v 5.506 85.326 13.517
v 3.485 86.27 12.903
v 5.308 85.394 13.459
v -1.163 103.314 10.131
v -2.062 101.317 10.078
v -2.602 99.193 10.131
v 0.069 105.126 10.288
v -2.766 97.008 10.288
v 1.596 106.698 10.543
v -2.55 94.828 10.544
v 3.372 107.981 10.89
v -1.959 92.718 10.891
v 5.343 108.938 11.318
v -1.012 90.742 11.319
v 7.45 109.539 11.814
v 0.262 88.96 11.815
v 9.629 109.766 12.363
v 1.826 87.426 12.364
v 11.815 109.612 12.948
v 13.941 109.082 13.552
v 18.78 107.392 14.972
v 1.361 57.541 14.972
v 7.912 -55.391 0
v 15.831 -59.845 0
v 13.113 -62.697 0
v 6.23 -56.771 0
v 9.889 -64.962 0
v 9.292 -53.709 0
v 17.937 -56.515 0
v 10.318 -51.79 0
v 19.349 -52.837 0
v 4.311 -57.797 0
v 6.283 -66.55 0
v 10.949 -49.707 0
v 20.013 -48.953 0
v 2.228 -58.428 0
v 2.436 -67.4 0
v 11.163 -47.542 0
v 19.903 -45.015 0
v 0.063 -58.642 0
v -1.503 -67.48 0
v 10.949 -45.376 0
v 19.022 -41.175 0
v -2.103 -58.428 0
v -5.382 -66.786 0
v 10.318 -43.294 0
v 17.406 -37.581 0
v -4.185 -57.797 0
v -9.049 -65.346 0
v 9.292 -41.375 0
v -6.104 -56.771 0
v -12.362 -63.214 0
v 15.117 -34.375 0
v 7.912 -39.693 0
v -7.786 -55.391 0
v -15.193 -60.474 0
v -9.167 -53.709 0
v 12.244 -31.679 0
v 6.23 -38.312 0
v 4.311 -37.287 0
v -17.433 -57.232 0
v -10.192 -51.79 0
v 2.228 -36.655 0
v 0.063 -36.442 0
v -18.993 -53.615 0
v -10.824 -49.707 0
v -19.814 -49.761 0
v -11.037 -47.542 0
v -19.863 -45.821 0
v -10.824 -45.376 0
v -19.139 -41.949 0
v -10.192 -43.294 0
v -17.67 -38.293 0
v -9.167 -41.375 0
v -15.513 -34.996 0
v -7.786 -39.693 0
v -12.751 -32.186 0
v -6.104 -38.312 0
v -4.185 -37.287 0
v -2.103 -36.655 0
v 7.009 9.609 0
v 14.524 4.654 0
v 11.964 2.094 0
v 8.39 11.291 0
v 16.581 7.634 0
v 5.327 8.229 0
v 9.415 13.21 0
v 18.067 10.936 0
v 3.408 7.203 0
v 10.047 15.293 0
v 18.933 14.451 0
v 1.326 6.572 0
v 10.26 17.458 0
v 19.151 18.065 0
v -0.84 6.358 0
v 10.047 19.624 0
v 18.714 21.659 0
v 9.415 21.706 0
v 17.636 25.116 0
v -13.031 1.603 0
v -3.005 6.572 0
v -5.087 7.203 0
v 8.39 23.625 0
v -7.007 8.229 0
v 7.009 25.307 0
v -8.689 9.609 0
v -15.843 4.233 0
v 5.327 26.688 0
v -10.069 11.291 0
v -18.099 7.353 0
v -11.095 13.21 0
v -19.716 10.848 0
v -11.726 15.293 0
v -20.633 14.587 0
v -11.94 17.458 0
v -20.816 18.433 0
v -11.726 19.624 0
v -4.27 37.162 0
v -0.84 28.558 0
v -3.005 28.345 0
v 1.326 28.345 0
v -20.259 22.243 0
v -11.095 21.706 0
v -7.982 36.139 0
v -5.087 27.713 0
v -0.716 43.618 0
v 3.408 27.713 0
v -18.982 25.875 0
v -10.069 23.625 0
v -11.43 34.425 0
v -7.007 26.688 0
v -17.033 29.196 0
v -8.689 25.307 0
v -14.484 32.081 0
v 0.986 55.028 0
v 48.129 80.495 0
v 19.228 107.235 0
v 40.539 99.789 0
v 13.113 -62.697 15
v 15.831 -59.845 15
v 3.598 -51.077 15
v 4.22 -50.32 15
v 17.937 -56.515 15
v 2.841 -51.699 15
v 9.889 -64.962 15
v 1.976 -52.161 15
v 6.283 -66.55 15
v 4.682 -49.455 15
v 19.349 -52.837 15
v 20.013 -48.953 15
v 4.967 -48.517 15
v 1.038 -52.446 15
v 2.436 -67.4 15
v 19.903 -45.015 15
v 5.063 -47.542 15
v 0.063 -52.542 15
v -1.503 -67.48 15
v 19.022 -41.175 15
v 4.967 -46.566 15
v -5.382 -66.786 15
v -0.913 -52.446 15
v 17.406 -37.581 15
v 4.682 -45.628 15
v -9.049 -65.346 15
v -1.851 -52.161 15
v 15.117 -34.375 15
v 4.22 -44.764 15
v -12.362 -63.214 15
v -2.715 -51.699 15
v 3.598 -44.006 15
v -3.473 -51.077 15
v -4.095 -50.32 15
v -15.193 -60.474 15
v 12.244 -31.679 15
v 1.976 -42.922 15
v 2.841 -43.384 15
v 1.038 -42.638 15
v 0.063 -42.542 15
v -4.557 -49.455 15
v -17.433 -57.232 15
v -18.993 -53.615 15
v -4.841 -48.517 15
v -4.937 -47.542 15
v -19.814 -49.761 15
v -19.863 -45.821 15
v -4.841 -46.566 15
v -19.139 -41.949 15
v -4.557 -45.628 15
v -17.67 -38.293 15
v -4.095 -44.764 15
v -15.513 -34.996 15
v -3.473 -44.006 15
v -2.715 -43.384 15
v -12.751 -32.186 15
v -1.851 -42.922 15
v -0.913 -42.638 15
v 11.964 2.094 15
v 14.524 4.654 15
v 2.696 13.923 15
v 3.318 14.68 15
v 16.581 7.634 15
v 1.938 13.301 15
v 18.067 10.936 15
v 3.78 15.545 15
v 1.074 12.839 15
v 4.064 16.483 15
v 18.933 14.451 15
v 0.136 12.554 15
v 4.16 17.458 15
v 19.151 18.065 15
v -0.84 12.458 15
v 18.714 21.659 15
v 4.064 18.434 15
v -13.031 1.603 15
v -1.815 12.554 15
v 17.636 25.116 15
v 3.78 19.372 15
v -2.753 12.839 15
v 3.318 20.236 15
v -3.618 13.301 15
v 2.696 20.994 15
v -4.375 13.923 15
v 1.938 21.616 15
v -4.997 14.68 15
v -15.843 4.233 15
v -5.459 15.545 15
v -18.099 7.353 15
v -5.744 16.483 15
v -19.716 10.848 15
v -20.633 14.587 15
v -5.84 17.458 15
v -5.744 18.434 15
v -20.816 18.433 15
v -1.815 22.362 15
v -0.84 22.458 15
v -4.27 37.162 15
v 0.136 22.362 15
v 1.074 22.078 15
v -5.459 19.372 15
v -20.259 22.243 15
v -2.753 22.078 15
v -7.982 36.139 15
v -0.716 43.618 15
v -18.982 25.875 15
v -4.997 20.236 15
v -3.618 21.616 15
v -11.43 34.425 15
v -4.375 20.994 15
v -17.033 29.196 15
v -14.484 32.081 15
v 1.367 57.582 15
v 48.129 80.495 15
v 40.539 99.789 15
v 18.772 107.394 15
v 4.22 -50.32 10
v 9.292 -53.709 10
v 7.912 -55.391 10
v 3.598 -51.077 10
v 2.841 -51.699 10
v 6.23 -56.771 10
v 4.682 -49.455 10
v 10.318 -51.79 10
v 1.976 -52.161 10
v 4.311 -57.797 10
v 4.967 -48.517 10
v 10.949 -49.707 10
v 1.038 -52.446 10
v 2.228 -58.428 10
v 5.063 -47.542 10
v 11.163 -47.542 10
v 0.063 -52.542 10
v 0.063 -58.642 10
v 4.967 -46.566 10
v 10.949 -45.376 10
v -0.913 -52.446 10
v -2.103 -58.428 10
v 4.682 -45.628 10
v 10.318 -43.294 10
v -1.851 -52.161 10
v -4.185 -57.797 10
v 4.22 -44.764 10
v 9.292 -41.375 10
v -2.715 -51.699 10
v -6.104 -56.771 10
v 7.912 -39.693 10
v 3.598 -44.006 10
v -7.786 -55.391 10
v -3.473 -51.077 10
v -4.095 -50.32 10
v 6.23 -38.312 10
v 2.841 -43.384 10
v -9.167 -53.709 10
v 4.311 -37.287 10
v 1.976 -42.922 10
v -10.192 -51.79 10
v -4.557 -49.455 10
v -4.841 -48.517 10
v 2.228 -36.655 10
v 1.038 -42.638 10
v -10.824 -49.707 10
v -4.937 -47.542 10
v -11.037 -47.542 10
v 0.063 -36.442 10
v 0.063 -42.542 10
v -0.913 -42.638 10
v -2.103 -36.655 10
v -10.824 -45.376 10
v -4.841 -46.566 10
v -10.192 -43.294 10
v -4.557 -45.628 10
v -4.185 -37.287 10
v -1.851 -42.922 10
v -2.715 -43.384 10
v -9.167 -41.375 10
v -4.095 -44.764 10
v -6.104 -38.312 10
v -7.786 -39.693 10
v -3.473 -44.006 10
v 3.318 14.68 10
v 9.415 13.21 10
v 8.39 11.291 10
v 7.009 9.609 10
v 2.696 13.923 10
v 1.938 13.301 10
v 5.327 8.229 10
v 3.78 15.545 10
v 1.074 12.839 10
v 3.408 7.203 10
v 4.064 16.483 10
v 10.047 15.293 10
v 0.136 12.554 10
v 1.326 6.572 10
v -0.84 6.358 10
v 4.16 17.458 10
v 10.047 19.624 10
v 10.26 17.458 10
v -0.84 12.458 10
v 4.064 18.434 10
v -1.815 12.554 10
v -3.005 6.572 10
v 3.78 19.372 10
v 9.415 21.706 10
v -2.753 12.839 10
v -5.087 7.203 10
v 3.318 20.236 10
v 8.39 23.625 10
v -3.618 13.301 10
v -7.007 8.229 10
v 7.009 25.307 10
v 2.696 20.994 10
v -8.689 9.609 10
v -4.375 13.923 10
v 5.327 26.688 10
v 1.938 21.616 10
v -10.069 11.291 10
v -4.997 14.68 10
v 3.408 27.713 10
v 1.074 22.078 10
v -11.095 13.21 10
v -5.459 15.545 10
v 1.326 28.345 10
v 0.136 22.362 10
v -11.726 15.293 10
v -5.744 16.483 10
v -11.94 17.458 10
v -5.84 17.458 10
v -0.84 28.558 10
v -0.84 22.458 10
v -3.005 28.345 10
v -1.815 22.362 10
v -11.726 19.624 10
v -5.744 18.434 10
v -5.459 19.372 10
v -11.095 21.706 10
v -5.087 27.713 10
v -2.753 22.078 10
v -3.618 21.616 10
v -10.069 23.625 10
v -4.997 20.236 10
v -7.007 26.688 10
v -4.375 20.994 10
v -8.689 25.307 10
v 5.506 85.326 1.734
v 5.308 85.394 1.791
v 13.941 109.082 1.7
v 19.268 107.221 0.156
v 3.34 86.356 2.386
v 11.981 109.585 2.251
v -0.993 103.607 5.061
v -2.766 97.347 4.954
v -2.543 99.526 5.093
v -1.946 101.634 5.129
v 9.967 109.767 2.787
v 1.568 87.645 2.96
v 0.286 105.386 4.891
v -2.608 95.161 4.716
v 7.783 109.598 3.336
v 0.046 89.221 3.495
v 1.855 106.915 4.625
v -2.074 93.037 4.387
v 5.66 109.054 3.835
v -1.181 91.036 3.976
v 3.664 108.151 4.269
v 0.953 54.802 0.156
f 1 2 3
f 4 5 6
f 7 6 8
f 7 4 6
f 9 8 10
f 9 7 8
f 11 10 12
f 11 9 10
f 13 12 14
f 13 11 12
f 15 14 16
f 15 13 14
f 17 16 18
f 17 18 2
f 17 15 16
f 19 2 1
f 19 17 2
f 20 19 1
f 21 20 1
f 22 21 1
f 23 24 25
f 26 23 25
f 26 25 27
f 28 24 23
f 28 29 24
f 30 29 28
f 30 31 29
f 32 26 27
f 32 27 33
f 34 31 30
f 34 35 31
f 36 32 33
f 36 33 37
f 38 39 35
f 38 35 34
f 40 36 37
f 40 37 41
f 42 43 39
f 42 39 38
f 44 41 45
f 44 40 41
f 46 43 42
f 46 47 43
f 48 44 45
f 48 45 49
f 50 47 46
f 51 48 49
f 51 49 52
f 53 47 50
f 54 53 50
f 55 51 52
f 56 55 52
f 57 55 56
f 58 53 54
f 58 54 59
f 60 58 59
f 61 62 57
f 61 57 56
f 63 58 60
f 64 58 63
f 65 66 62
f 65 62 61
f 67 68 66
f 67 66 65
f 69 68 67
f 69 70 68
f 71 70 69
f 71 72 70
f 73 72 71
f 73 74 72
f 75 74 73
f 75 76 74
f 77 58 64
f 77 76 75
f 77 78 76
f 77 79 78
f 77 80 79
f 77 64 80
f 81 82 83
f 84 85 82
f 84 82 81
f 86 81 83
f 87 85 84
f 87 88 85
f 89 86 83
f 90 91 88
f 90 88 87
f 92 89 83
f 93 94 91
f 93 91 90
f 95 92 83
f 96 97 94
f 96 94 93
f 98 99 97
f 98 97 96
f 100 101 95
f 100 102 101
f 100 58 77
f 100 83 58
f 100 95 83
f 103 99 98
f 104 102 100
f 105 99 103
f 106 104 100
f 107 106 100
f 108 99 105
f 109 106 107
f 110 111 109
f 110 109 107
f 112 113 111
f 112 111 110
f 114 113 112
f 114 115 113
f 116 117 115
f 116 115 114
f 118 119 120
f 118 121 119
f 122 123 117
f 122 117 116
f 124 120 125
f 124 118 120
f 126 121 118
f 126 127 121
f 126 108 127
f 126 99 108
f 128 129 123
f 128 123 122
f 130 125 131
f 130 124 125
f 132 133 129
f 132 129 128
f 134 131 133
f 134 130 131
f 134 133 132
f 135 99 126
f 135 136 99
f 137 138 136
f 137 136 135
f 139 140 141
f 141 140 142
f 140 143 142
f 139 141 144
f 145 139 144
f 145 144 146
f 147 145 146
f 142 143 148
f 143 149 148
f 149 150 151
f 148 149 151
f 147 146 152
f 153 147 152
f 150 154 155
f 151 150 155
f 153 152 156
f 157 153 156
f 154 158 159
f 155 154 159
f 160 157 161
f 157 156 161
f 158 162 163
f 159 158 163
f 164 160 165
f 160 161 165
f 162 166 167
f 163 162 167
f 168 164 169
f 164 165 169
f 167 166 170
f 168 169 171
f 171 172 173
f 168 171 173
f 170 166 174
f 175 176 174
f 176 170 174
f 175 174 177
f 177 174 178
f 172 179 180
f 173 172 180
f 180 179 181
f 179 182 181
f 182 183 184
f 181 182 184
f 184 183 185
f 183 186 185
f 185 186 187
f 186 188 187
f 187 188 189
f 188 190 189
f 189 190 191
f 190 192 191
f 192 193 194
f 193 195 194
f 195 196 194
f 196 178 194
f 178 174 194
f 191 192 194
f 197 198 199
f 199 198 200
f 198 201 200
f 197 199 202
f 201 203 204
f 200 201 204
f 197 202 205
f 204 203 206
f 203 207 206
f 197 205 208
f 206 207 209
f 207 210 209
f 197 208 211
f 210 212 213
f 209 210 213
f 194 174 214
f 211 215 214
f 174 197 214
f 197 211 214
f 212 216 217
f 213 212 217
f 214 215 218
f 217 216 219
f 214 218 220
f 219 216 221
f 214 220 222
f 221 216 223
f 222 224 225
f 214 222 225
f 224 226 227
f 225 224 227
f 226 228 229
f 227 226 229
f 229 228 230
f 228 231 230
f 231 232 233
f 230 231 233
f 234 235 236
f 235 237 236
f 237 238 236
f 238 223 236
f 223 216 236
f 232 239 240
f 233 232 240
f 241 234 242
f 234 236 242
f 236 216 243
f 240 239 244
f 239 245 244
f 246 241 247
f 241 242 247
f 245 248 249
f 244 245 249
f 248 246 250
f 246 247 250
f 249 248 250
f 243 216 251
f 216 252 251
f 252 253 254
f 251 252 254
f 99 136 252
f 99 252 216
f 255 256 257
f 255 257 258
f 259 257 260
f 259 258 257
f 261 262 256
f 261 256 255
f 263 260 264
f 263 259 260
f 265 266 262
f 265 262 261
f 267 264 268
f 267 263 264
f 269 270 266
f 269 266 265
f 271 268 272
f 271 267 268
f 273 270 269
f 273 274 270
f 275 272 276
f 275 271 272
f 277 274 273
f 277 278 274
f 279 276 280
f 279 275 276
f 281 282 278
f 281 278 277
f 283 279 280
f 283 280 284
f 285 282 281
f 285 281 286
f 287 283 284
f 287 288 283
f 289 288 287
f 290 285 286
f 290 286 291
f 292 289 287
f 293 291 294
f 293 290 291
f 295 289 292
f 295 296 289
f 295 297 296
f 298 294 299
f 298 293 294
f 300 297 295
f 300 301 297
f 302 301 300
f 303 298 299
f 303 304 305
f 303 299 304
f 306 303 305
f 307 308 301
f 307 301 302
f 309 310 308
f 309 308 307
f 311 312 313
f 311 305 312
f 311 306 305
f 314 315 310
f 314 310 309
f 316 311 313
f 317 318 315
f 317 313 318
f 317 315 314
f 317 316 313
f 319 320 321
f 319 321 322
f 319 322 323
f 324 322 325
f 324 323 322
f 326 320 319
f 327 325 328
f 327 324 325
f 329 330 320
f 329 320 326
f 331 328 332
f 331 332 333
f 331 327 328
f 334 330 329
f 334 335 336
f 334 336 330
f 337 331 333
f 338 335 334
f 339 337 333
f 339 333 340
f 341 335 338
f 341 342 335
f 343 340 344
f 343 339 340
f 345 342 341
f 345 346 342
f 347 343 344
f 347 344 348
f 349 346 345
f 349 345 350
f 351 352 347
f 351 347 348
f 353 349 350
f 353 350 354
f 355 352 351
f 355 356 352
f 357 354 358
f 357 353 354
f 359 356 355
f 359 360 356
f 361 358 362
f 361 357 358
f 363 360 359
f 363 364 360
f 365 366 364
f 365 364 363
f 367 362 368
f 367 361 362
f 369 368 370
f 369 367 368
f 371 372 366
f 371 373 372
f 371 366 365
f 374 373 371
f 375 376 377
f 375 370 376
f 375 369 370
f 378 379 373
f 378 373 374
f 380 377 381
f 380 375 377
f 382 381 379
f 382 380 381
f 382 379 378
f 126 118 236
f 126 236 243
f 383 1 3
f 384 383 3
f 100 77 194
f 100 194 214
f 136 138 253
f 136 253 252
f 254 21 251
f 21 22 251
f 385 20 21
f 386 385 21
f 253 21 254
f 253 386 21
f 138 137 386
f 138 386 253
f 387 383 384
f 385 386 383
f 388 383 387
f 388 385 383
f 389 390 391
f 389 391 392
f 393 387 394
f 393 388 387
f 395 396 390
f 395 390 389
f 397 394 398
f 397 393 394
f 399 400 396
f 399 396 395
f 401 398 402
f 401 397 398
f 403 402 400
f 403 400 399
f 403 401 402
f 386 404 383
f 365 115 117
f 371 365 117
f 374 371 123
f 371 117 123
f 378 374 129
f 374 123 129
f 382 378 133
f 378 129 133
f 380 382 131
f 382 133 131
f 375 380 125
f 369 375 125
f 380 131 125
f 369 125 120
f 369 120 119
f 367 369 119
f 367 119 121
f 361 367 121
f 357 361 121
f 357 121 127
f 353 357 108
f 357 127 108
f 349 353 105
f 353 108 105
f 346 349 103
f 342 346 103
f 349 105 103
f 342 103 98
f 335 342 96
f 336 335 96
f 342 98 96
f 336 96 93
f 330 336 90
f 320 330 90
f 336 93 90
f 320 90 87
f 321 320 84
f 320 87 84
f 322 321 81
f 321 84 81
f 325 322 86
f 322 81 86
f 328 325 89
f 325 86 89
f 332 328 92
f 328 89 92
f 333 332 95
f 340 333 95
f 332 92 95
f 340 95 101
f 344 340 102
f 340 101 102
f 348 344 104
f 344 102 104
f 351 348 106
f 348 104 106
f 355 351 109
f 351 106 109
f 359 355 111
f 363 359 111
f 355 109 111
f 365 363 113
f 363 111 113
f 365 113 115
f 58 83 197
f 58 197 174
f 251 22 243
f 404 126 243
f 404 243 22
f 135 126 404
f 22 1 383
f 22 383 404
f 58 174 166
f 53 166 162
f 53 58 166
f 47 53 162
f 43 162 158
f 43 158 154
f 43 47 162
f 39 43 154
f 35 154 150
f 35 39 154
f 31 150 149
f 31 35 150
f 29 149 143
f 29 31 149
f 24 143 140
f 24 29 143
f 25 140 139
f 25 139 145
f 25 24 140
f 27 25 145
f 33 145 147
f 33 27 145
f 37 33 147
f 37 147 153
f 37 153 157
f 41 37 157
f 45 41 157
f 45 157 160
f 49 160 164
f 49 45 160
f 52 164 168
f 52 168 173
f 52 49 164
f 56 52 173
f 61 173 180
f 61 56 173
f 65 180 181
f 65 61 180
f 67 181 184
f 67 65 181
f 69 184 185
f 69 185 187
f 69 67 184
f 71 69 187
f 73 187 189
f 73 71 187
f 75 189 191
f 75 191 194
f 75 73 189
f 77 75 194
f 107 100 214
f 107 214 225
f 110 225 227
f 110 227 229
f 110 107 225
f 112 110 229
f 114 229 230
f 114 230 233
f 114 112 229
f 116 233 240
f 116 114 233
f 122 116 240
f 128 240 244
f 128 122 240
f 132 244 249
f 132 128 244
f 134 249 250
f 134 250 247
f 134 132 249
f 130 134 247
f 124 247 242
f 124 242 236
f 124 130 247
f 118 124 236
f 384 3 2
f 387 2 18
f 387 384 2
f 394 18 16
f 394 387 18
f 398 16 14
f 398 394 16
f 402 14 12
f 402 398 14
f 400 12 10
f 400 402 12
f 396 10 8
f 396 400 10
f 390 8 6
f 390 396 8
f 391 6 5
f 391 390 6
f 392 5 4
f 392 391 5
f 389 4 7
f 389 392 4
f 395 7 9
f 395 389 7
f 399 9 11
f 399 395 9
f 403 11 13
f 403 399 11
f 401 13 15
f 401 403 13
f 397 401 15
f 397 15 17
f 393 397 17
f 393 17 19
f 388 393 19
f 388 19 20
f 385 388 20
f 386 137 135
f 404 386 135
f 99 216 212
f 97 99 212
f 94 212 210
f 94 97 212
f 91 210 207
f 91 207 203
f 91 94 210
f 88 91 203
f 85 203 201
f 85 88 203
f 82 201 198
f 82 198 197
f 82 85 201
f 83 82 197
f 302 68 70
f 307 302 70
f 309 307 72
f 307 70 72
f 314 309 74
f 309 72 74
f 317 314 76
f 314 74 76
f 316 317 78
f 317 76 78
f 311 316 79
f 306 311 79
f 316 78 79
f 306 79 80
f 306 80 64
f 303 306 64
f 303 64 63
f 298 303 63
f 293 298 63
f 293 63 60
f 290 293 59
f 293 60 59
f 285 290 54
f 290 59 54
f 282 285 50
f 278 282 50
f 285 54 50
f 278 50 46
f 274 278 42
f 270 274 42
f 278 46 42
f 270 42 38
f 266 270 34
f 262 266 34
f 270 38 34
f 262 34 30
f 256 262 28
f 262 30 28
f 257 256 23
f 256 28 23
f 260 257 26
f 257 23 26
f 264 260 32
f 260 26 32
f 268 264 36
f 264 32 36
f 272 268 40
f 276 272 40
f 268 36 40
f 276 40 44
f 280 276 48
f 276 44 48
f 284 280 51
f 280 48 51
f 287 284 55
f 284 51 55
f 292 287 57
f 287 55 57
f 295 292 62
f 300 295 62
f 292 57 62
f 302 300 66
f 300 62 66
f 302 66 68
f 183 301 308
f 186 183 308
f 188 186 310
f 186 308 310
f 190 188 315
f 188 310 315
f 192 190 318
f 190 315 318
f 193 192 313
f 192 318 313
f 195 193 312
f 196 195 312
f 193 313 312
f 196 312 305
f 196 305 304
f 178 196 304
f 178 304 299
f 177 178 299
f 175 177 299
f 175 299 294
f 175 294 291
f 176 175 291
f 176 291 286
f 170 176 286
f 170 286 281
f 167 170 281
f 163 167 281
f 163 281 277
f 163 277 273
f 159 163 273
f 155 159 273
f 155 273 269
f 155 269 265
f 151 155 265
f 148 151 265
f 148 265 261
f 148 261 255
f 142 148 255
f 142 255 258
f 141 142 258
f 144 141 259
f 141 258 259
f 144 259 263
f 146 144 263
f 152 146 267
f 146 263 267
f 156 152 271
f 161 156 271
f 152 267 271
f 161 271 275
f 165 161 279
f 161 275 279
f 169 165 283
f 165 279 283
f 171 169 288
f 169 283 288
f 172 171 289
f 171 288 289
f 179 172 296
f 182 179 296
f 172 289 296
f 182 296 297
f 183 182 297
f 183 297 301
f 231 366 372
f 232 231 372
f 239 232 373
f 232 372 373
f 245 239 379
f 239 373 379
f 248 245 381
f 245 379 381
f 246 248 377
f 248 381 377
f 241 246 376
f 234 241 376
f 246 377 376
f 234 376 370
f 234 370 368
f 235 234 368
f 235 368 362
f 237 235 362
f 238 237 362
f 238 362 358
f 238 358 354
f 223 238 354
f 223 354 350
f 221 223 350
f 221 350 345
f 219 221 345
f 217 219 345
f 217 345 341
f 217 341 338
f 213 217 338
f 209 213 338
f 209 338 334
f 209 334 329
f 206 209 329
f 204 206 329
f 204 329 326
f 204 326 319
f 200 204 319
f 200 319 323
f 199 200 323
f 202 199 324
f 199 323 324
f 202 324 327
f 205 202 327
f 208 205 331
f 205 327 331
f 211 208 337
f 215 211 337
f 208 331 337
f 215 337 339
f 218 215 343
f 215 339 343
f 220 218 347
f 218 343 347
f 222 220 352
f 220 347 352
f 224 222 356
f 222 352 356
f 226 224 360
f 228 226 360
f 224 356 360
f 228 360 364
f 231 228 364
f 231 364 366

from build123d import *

# Parameters (mm, degrees)
BOSS_EXTRUDE1_DEPTH     = 15
SKETCH2_R               = 11.1
CUT_EXTRUDE1_DEPTH      = 10
SKETCH3_R               = 5
CUT_EXTRUDE2_DEPTH      = 10
CUT_EXTRUDE_THIN7_DEPTH = 62


with BuildPart() as part:
    # Sketch1 → Boss-Extrude1 (new body)
    with BuildSketch(Plane.XY):
        with BuildLine():
            Line((5.505816945, 85.326012217), (5.307768654, 85.393580353))
            ThreePointArc((5.307768654, 85.393580353), (-2.005055015, 101.475976607), (13.940536847, 109.082484312))
            Line((13.940536847, 109.082484312), (40.538740524, 99.7887516))
            Line((40.538740524, 99.7887516), (48.129208704, 80.495248668))
            Line((48.129208704, 80.495248668), (17.636215156, 25.115965593))
            ThreePointArc((17.636215156, 25.115965593), (18.579608232, 12.6739017), (11.964278199, 2.09409296))
            Line((11.964278199, 2.09409296), (12.243619866, -31.678974911))
            ThreePointArc((12.243619866, -31.678974911), (0.468324559, -67.537617109), (-12.751239862, -32.185913949))
            Line((-12.751239862, -32.185913949), (-13.03091257, 1.603476045))
            ThreePointArc((-13.03091257, 1.603476045), (-20.259022529, 22.242640416), (-4.270337109, 37.161843413))
            Line((-4.270337109, 37.161843413), (-0.71558036, 43.617748767))
            Line((-0.71558036, 43.617748767), (5.505816945, 85.326012217))
        make_face()
    extrude(amount=BOSS_EXTRUDE1_DEPTH)

    # Sketch2 → Cut-Extrude1 (cut)
    with BuildSketch(Plane(origin=(0, 0, 0), x_dir=(-1, 0, 0), z_dir=(0, 0, -1))):
        with Locations((0.839707244, 17.458270673)):
            Circle(SKETCH2_R)
        with Locations((-0.062773329, -47.541729327)):
            Circle(SKETCH2_R)
    extrude(amount=-CUT_EXTRUDE1_DEPTH, mode=Mode.SUBTRACT)

    # Sketch3 → Cut-Extrude2 (cut)
    with BuildSketch(Plane(origin=(0, 0, 10), x_dir=(-1, 0, 0), z_dir=(0, 0, -1))):
        with Locations((0.839707244, 17.458270673)):
            Circle(SKETCH3_R)
        with Locations((-0.062773329, -47.541729327)):
            Circle(SKETCH3_R)
    extrude(amount=-CUT_EXTRUDE2_DEPTH, mode=Mode.SUBTRACT)

    # Sketch4 → Cut-Extrude-Thin7 (cut)
    with BuildSketch(Plane(origin=(35.484462303, 101.554777284, 0), x_dir=(0.944031293, -0.329855904, 0), z_dir=(0.329855904, 0.944031293, 0))):
        Polygon((-17.177390776, -0.155952815), (-35.822204189, -5.255346546), (-38.460333018, 4.390392216), (-19.815519606, 9.489785947), align=None)
        Polygon((-36.000883233, -9.902707664), (-17.695137785, -14.971739454), (-20.363805607, -24.609073736), (-38.669551056, -19.540041946), align=None)
    extrude(amount=-CUT_EXTRUDE_THIN7_DEPTH, mode=Mode.SUBTRACT)


solid = part.part
